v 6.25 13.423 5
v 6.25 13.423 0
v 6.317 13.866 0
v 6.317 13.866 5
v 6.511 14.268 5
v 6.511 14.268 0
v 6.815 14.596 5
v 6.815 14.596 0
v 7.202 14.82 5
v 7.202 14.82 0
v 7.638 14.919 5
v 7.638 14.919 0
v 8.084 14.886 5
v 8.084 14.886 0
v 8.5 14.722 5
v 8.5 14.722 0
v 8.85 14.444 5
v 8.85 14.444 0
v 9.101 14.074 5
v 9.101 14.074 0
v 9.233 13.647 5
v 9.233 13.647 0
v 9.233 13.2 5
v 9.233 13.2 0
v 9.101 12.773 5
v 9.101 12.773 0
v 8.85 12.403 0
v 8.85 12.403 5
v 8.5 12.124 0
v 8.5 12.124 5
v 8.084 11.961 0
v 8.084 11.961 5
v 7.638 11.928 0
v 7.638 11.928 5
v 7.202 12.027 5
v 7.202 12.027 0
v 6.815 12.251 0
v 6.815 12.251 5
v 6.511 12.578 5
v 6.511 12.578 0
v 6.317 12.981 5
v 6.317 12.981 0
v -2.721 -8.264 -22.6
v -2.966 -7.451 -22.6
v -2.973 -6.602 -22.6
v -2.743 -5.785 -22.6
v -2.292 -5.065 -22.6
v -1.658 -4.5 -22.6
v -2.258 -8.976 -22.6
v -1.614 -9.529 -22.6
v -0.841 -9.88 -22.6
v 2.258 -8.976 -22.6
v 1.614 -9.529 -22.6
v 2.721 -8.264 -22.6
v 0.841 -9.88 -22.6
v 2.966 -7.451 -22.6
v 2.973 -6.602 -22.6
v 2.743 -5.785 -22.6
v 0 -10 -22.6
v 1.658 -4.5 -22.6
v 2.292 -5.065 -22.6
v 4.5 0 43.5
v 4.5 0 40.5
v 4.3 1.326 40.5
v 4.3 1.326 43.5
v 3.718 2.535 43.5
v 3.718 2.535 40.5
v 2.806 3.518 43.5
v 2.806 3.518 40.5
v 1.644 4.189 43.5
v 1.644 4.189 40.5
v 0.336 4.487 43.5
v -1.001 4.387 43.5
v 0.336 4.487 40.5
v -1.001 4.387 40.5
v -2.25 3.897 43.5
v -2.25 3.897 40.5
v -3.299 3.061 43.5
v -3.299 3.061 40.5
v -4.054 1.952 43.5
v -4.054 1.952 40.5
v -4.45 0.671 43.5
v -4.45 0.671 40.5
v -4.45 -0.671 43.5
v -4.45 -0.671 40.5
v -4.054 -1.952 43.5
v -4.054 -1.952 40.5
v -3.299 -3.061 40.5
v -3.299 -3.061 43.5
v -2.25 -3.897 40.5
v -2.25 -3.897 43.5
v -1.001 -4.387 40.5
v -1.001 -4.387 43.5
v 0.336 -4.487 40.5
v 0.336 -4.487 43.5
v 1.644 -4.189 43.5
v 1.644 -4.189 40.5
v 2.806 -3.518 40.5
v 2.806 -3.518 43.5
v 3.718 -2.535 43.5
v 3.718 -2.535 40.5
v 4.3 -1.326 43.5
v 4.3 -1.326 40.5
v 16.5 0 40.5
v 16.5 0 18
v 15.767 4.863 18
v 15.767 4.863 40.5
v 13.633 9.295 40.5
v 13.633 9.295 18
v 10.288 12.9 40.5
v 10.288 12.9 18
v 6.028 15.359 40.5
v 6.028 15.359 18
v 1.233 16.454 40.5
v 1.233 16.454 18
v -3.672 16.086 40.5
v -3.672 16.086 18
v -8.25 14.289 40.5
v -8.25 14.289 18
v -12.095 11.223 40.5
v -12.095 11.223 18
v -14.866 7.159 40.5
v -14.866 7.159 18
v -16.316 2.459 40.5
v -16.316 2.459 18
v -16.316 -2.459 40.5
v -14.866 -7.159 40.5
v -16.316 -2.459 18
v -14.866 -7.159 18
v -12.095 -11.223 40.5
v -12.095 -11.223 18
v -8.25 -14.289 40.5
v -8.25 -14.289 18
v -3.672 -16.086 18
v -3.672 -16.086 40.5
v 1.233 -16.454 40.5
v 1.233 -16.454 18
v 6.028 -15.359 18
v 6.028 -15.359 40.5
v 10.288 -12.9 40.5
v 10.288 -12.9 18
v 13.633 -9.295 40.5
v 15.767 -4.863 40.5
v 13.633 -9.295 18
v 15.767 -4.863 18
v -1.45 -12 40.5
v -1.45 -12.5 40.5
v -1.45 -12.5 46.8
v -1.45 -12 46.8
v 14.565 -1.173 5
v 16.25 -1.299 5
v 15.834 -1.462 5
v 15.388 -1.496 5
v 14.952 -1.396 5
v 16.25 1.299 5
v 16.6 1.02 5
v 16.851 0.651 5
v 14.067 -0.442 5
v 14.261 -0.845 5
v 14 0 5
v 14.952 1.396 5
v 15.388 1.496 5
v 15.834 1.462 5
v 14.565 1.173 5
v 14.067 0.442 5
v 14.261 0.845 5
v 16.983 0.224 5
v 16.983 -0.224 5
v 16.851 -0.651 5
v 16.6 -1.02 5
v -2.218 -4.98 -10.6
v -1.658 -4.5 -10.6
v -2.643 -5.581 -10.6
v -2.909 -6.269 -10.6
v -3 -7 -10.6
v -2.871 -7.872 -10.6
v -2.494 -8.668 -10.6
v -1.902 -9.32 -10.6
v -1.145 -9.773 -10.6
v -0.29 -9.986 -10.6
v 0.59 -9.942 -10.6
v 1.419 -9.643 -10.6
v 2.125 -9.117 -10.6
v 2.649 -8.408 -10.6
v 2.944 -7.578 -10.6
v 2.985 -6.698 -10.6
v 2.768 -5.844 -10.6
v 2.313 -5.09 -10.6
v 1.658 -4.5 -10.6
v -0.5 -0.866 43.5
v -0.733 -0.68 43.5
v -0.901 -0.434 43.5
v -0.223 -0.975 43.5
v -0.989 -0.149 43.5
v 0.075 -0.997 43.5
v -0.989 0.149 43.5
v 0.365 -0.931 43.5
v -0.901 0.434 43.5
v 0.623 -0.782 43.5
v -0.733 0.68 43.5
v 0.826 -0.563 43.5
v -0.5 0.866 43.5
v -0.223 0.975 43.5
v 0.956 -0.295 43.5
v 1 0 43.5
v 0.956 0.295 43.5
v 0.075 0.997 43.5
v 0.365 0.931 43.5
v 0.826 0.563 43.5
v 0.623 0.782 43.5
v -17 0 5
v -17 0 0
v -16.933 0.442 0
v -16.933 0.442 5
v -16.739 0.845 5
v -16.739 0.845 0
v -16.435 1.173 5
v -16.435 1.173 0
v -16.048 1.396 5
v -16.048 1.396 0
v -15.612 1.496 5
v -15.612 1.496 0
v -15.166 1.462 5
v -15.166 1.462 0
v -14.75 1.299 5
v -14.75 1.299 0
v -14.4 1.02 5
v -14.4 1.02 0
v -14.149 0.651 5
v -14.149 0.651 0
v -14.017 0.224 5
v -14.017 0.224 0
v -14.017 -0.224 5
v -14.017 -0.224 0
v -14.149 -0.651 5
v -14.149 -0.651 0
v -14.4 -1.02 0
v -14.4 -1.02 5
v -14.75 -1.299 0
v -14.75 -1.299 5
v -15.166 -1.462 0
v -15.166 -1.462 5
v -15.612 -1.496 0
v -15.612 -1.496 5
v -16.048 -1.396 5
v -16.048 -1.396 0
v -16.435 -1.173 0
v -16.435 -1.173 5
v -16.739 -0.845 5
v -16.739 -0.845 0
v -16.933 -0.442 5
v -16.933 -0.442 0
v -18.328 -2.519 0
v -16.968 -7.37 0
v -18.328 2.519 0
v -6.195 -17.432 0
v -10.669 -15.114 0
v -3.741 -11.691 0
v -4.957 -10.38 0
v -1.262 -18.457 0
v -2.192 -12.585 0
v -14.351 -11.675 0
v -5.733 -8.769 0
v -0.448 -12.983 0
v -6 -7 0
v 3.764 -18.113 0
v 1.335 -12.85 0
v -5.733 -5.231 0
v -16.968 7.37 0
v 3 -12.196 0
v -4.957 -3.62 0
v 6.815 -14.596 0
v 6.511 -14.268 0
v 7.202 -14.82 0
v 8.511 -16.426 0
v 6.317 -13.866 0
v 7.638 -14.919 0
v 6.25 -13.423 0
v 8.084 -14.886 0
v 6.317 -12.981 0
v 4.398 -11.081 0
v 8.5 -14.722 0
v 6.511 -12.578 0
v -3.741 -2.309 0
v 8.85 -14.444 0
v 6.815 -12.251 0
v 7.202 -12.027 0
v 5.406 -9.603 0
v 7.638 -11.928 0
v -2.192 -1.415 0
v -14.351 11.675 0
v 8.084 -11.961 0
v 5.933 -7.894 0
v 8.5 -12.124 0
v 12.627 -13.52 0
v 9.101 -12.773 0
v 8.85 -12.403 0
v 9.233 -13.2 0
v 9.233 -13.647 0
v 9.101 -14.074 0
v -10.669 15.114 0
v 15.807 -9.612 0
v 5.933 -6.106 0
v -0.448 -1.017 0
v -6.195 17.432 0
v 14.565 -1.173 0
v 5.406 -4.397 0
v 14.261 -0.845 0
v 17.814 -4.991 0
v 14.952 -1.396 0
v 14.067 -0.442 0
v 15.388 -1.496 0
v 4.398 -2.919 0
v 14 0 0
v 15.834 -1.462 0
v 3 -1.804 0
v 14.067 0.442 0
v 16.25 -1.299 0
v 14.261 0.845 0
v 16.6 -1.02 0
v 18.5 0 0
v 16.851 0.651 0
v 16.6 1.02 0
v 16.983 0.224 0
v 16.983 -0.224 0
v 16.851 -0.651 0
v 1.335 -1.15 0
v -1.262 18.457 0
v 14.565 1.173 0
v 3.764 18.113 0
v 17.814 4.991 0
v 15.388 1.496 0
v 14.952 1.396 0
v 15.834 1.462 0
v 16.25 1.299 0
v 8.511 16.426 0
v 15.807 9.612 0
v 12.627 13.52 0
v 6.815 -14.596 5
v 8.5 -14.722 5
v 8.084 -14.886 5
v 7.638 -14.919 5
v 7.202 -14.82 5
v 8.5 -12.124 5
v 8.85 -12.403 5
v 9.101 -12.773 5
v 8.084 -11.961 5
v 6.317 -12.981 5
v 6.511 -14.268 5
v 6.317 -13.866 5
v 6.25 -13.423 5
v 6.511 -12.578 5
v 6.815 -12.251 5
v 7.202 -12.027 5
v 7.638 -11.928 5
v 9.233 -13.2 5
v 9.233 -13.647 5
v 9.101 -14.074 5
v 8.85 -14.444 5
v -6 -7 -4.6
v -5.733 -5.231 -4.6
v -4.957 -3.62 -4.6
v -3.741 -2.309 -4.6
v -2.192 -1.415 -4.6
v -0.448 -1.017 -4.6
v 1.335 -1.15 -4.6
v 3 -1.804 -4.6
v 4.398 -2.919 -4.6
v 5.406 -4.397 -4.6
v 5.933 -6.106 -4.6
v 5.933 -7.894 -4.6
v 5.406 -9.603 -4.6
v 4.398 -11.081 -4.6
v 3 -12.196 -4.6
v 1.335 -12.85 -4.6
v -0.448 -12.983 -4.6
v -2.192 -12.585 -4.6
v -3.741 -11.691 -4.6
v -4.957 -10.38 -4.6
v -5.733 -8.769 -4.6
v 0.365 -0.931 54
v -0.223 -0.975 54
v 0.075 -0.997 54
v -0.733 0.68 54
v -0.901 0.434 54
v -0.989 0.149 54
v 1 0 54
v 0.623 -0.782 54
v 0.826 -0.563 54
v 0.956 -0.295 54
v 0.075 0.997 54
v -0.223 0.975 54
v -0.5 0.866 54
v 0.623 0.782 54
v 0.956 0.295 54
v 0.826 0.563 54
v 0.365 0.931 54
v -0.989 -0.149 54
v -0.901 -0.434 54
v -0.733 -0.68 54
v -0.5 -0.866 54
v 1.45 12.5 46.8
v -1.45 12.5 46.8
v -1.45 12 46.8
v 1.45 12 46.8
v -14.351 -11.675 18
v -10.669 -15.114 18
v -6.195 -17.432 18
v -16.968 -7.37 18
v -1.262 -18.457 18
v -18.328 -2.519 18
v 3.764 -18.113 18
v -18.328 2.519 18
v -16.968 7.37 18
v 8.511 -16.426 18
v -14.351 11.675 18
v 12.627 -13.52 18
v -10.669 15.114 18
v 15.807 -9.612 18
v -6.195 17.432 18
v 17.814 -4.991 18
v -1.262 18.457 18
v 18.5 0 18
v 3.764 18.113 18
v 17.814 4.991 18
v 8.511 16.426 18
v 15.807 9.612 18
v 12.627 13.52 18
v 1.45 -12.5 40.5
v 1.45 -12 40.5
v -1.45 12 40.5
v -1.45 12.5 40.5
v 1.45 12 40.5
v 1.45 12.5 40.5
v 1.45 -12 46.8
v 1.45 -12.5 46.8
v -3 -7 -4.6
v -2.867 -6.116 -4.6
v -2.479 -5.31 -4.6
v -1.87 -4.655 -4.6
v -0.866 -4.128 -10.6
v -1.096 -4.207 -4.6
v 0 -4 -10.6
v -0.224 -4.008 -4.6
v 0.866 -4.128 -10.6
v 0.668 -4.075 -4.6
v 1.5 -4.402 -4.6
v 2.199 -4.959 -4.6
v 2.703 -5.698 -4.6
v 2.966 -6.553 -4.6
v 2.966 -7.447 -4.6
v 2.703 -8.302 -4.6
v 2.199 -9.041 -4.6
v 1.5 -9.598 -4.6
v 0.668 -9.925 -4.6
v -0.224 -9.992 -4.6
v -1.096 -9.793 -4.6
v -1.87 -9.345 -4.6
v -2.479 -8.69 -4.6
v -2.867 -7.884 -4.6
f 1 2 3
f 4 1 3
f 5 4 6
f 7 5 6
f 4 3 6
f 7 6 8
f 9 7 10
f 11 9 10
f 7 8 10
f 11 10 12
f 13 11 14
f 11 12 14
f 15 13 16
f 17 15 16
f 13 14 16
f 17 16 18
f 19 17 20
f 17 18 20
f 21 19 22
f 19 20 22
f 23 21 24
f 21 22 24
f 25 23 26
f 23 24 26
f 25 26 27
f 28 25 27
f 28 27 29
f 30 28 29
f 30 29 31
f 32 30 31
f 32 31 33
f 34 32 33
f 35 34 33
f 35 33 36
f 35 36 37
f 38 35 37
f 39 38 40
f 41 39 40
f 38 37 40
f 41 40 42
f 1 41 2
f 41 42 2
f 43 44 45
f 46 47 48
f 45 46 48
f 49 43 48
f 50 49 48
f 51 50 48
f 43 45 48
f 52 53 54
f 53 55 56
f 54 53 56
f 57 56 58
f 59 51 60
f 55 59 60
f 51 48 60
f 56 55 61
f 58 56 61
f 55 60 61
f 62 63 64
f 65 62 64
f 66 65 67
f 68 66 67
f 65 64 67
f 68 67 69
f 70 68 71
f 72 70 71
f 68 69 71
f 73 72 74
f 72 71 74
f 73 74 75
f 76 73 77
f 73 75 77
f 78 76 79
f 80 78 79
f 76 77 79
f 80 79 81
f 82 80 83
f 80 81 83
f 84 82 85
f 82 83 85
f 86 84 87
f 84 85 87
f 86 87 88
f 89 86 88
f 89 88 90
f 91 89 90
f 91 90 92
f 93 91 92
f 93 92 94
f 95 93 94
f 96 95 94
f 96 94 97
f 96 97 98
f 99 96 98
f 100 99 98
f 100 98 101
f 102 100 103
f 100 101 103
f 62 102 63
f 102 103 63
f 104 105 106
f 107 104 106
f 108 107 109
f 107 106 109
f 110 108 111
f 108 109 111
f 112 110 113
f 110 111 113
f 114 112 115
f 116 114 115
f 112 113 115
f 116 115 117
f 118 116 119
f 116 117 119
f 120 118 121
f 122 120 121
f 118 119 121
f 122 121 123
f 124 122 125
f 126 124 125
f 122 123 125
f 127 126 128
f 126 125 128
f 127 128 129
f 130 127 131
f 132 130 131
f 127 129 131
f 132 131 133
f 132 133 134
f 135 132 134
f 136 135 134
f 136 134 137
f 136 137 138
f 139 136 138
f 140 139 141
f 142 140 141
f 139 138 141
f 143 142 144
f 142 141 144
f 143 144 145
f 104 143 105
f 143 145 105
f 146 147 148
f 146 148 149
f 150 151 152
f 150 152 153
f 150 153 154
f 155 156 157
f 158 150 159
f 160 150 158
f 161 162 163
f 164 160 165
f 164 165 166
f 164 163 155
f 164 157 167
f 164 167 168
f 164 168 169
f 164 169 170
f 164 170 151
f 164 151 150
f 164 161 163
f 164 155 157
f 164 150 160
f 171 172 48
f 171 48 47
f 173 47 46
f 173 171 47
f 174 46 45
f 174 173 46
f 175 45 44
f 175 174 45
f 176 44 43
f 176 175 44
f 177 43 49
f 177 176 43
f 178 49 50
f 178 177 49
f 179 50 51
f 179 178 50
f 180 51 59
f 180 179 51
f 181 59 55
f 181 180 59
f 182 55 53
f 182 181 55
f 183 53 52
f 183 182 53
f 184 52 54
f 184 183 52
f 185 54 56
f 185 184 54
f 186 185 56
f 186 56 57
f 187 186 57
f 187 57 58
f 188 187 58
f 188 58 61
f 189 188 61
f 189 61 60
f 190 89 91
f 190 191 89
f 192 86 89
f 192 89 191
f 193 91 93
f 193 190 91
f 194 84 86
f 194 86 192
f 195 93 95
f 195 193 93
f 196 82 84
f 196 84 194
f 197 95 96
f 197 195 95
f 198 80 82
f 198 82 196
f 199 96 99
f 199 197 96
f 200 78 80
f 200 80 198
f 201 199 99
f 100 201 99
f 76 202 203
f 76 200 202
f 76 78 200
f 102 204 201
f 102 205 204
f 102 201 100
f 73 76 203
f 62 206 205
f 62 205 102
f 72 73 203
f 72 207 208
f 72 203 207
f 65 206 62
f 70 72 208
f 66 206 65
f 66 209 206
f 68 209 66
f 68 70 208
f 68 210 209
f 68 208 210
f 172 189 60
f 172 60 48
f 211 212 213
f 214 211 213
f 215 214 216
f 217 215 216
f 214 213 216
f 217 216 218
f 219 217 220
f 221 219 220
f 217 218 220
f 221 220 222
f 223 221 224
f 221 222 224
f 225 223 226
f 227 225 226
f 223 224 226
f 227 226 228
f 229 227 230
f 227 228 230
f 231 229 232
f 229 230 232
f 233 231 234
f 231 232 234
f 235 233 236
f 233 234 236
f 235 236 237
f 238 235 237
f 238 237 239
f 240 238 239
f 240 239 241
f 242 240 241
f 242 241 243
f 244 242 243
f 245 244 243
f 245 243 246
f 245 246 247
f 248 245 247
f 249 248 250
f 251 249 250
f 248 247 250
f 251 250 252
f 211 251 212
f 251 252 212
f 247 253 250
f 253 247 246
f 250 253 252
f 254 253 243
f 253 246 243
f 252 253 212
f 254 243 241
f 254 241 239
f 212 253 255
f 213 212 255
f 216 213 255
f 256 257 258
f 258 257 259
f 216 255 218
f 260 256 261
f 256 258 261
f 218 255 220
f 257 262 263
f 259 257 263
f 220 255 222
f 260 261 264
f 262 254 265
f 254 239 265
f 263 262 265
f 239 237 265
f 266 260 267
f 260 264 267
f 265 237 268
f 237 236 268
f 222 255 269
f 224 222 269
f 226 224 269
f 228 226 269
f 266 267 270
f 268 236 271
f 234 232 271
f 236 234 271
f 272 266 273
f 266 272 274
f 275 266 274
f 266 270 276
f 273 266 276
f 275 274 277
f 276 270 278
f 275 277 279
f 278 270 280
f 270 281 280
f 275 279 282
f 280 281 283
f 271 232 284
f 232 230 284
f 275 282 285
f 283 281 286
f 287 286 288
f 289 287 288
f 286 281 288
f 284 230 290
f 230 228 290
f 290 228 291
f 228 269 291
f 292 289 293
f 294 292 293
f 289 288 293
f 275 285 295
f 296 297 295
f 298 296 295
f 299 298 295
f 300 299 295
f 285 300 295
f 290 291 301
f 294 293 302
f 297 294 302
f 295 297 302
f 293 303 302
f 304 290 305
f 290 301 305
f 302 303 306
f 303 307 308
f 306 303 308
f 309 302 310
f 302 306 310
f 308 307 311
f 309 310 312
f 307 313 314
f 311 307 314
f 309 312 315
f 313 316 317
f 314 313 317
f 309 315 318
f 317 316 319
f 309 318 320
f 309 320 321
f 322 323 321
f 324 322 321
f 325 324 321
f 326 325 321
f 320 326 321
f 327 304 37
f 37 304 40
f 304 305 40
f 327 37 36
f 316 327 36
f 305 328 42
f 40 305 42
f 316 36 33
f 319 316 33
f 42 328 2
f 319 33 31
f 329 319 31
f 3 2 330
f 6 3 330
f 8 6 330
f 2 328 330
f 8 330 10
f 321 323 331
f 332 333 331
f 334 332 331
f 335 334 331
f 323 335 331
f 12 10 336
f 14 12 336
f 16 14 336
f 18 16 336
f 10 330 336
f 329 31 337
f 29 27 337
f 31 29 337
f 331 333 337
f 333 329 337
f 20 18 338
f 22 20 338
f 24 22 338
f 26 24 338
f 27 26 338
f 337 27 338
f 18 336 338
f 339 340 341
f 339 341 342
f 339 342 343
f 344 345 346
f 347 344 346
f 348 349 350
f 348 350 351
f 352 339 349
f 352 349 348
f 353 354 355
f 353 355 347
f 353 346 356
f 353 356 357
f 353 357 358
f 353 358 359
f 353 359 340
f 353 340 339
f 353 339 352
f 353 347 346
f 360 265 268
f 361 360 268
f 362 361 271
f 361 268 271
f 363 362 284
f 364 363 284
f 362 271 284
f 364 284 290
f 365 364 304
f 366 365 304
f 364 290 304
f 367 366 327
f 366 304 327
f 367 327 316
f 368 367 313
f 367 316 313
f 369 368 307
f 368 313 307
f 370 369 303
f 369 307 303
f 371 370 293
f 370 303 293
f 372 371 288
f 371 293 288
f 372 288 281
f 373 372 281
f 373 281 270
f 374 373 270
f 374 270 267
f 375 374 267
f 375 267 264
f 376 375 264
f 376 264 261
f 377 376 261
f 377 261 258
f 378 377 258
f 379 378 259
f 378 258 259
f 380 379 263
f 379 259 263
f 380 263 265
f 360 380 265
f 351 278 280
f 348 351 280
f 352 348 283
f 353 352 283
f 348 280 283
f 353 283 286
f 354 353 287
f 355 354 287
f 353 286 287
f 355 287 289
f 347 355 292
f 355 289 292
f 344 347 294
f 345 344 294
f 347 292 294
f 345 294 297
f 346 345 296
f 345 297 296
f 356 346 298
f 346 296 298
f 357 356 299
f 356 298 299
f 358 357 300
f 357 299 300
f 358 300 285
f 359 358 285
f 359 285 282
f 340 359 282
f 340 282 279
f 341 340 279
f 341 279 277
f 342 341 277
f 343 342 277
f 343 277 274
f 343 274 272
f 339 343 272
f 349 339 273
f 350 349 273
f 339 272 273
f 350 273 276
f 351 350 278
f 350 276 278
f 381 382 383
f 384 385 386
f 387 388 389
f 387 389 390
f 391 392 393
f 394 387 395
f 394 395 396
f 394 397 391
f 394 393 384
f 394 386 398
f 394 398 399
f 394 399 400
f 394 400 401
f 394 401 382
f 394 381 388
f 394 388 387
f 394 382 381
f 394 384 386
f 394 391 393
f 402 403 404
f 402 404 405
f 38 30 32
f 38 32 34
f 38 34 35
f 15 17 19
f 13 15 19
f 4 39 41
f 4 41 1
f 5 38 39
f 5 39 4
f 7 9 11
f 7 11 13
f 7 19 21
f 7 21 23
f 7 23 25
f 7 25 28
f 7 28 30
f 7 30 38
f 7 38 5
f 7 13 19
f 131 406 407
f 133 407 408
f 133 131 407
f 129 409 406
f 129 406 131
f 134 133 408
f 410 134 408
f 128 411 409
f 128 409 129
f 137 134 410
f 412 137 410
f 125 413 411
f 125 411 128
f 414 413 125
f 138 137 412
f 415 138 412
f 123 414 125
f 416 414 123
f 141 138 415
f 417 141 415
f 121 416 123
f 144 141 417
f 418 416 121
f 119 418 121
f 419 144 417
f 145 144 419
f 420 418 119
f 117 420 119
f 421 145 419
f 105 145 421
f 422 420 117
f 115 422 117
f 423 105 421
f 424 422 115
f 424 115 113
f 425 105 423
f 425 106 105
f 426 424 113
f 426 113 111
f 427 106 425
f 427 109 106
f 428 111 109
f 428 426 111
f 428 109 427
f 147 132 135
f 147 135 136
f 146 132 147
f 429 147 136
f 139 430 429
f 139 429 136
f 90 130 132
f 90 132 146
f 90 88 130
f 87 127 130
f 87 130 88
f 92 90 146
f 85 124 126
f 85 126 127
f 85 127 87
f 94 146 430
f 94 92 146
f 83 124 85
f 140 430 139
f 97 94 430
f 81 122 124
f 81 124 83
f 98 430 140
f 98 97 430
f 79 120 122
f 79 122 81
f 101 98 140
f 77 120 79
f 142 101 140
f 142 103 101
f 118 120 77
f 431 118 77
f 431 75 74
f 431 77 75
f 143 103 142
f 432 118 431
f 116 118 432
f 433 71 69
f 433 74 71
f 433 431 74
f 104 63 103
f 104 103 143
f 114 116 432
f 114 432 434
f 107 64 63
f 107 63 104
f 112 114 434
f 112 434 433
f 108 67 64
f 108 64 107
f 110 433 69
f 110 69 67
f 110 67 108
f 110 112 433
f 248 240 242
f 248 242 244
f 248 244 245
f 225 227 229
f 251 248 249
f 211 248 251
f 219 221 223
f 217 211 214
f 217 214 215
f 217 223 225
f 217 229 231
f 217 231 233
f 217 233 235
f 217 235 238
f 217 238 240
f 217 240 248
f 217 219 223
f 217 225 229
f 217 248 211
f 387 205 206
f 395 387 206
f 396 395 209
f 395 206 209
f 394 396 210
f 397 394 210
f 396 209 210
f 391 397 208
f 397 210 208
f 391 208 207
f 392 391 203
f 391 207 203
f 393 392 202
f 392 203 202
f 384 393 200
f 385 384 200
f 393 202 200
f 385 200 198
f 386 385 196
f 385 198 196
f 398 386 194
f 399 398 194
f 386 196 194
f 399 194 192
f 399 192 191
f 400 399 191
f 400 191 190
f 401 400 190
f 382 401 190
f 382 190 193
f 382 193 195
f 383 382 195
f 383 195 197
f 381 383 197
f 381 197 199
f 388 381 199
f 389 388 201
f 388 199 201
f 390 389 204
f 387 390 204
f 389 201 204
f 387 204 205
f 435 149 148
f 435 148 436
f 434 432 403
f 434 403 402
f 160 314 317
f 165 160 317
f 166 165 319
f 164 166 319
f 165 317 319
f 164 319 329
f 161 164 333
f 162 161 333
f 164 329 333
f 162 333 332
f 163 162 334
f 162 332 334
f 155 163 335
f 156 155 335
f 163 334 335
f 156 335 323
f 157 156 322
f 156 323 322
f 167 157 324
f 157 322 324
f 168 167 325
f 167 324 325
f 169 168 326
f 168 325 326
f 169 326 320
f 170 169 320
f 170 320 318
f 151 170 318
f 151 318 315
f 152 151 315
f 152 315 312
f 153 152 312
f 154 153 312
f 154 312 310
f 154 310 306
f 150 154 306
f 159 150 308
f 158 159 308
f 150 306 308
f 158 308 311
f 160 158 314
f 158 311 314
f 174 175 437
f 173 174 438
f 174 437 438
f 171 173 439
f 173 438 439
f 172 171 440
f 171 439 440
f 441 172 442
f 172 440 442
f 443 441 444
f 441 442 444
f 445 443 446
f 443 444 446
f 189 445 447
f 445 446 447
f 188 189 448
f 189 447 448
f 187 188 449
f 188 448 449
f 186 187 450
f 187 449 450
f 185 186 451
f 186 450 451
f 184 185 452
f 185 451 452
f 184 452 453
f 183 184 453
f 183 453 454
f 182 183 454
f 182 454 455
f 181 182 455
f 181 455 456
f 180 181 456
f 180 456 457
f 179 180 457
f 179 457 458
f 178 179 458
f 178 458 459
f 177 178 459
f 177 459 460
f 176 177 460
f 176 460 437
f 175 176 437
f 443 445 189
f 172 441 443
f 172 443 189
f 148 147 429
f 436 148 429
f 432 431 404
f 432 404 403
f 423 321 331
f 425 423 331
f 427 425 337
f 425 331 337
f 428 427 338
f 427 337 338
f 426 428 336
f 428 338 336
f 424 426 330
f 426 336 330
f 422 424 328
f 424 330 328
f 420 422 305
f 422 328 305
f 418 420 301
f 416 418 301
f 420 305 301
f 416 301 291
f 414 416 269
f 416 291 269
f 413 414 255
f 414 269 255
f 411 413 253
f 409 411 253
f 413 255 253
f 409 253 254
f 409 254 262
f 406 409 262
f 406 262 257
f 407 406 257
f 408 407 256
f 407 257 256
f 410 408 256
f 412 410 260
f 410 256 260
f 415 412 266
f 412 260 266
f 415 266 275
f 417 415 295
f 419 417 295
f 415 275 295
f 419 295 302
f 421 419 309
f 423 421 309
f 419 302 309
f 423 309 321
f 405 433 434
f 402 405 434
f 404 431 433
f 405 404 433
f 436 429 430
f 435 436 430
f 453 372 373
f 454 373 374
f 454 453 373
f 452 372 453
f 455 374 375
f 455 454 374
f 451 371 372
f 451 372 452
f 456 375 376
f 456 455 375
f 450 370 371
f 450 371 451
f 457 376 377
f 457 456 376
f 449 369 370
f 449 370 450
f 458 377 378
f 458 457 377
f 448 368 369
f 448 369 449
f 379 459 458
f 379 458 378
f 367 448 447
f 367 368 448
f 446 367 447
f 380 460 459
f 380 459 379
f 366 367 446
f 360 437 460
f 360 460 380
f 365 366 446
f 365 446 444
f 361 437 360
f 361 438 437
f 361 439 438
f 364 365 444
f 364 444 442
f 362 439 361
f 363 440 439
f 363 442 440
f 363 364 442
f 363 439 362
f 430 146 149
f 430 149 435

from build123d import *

# Parameters (mm, degrees)
CROQUIS1_R              = 18.5
SALIENTE_EXTRUIR1_DEPTH = 18
CROQUIS2_R              = 16.5
SALIENTE_EXTRUIR2_DEPTH = 22.5
CROQUIS3_R              = 4.5
SALIENTE_EXTRUIR3_DEPTH = 3
CROQUIS4_R              = 1
SALIENTE_EXTRUIR4_DEPTH = 10.5
CROQUIS5_W              = 2.9
CROQUIS5_H              = 0.5
SALIENTE_EXTRUIR5_DEPTH = 6.3
CROQUIS6_R              = 6
SALIENTE_EXTRUIR6_DEPTH = 4.6
CROQUIS7_R              = 3
SALIENTE_EXTRUIR7_DEPTH = 6
SALIENTE_EXTRUIR8_DEPTH = 12
CROQUIS9_R              = 1.5
CORTAR_EXTRUIR1_DEPTH   = 5


with BuildPart() as part:
    # Croquis1 → Saliente-Extruir1 (new body)
    with BuildSketch(Plane.XY):
        Circle(CROQUIS1_R)
    extrude(amount=SALIENTE_EXTRUIR1_DEPTH)

    # Croquis2 → Saliente-Extruir2 (add)
    with BuildSketch(Plane.XY.offset(18)):
        Circle(CROQUIS2_R)
    extrude(amount=SALIENTE_EXTRUIR2_DEPTH)

    # Croquis3 → Saliente-Extruir3 (add)
    with BuildSketch(Plane.XY.offset(40.5)):
        Circle(CROQUIS3_R)
    extrude(amount=SALIENTE_EXTRUIR3_DEPTH)

    # Croquis4 → Saliente-Extruir4 (add)
    with BuildSketch(Plane.XY.offset(43.5)):
        Circle(CROQUIS4_R)
    extrude(amount=SALIENTE_EXTRUIR4_DEPTH)

    # Croquis5 → Saliente-Extruir5 (add)
    with BuildSketch(Plane.XY.offset(40.5)):
        with Locations((0, 12.25)):
            Rectangle(CROQUIS5_W, CROQUIS5_H)
        with Locations((0, -12.25)):
            Rectangle(CROQUIS5_W, CROQUIS5_H)
    extrude(amount=SALIENTE_EXTRUIR5_DEPTH)

    # Croquis6 → Saliente-Extruir6 (add)
    with BuildSketch(Plane(origin=(0, 0, 0), x_dir=(-1, 0, 0), z_dir=(0, 0, -1))):
        with Locations((0, -7)):
            Circle(CROQUIS6_R)
    extrude(amount=SALIENTE_EXTRUIR6_DEPTH)

    # Croquis7 → Saliente-Extruir7 (add)
    with BuildSketch(Plane(origin=(0, 0, -4.6), x_dir=(-1, 0, 0), z_dir=(0, 0, -1))):
        with Locations((0, -7)):
            Circle(CROQUIS7_R)
    extrude(amount=SALIENTE_EXTRUIR7_DEPTH)

    # Croquis8 → Saliente-Extruir8 (add)
    with BuildSketch(Plane(origin=(0, 0, -10.6), x_dir=(-1, 0, 0), z_dir=(0, 0, -1))):
        with BuildLine():
            Line((-1.658312395, -4.5), (1.658312395, -4.5))
            ThreePointArc((1.658312395, -4.5), (0, -10), (-1.658312395, -4.5))
        make_face()
    extrude(amount=SALIENTE_EXTRUIR8_DEPTH)

    # Croquis9 → Cortar-Extruir1 (cut)
    with BuildSketch(Plane(origin=(0, 0, 0), x_dir=(-1, 0, 0), z_dir=(0, 0, -1))):
        with Locations((-7.75, 13.423393759)):
            Circle(CROQUIS9_R)
        with Locations((-15.5, 0)):
            Circle(CROQUIS9_R)
        with Locations((-7.75, -13.423393759)):
            Circle(CROQUIS9_R)
        with Locations((15.5, 0)):
            Circle(CROQUIS9_R)
    extrude(amount=-CORTAR_EXTRUIR1_DEPTH, mode=Mode.SUBTRACT)


solid = part.part
